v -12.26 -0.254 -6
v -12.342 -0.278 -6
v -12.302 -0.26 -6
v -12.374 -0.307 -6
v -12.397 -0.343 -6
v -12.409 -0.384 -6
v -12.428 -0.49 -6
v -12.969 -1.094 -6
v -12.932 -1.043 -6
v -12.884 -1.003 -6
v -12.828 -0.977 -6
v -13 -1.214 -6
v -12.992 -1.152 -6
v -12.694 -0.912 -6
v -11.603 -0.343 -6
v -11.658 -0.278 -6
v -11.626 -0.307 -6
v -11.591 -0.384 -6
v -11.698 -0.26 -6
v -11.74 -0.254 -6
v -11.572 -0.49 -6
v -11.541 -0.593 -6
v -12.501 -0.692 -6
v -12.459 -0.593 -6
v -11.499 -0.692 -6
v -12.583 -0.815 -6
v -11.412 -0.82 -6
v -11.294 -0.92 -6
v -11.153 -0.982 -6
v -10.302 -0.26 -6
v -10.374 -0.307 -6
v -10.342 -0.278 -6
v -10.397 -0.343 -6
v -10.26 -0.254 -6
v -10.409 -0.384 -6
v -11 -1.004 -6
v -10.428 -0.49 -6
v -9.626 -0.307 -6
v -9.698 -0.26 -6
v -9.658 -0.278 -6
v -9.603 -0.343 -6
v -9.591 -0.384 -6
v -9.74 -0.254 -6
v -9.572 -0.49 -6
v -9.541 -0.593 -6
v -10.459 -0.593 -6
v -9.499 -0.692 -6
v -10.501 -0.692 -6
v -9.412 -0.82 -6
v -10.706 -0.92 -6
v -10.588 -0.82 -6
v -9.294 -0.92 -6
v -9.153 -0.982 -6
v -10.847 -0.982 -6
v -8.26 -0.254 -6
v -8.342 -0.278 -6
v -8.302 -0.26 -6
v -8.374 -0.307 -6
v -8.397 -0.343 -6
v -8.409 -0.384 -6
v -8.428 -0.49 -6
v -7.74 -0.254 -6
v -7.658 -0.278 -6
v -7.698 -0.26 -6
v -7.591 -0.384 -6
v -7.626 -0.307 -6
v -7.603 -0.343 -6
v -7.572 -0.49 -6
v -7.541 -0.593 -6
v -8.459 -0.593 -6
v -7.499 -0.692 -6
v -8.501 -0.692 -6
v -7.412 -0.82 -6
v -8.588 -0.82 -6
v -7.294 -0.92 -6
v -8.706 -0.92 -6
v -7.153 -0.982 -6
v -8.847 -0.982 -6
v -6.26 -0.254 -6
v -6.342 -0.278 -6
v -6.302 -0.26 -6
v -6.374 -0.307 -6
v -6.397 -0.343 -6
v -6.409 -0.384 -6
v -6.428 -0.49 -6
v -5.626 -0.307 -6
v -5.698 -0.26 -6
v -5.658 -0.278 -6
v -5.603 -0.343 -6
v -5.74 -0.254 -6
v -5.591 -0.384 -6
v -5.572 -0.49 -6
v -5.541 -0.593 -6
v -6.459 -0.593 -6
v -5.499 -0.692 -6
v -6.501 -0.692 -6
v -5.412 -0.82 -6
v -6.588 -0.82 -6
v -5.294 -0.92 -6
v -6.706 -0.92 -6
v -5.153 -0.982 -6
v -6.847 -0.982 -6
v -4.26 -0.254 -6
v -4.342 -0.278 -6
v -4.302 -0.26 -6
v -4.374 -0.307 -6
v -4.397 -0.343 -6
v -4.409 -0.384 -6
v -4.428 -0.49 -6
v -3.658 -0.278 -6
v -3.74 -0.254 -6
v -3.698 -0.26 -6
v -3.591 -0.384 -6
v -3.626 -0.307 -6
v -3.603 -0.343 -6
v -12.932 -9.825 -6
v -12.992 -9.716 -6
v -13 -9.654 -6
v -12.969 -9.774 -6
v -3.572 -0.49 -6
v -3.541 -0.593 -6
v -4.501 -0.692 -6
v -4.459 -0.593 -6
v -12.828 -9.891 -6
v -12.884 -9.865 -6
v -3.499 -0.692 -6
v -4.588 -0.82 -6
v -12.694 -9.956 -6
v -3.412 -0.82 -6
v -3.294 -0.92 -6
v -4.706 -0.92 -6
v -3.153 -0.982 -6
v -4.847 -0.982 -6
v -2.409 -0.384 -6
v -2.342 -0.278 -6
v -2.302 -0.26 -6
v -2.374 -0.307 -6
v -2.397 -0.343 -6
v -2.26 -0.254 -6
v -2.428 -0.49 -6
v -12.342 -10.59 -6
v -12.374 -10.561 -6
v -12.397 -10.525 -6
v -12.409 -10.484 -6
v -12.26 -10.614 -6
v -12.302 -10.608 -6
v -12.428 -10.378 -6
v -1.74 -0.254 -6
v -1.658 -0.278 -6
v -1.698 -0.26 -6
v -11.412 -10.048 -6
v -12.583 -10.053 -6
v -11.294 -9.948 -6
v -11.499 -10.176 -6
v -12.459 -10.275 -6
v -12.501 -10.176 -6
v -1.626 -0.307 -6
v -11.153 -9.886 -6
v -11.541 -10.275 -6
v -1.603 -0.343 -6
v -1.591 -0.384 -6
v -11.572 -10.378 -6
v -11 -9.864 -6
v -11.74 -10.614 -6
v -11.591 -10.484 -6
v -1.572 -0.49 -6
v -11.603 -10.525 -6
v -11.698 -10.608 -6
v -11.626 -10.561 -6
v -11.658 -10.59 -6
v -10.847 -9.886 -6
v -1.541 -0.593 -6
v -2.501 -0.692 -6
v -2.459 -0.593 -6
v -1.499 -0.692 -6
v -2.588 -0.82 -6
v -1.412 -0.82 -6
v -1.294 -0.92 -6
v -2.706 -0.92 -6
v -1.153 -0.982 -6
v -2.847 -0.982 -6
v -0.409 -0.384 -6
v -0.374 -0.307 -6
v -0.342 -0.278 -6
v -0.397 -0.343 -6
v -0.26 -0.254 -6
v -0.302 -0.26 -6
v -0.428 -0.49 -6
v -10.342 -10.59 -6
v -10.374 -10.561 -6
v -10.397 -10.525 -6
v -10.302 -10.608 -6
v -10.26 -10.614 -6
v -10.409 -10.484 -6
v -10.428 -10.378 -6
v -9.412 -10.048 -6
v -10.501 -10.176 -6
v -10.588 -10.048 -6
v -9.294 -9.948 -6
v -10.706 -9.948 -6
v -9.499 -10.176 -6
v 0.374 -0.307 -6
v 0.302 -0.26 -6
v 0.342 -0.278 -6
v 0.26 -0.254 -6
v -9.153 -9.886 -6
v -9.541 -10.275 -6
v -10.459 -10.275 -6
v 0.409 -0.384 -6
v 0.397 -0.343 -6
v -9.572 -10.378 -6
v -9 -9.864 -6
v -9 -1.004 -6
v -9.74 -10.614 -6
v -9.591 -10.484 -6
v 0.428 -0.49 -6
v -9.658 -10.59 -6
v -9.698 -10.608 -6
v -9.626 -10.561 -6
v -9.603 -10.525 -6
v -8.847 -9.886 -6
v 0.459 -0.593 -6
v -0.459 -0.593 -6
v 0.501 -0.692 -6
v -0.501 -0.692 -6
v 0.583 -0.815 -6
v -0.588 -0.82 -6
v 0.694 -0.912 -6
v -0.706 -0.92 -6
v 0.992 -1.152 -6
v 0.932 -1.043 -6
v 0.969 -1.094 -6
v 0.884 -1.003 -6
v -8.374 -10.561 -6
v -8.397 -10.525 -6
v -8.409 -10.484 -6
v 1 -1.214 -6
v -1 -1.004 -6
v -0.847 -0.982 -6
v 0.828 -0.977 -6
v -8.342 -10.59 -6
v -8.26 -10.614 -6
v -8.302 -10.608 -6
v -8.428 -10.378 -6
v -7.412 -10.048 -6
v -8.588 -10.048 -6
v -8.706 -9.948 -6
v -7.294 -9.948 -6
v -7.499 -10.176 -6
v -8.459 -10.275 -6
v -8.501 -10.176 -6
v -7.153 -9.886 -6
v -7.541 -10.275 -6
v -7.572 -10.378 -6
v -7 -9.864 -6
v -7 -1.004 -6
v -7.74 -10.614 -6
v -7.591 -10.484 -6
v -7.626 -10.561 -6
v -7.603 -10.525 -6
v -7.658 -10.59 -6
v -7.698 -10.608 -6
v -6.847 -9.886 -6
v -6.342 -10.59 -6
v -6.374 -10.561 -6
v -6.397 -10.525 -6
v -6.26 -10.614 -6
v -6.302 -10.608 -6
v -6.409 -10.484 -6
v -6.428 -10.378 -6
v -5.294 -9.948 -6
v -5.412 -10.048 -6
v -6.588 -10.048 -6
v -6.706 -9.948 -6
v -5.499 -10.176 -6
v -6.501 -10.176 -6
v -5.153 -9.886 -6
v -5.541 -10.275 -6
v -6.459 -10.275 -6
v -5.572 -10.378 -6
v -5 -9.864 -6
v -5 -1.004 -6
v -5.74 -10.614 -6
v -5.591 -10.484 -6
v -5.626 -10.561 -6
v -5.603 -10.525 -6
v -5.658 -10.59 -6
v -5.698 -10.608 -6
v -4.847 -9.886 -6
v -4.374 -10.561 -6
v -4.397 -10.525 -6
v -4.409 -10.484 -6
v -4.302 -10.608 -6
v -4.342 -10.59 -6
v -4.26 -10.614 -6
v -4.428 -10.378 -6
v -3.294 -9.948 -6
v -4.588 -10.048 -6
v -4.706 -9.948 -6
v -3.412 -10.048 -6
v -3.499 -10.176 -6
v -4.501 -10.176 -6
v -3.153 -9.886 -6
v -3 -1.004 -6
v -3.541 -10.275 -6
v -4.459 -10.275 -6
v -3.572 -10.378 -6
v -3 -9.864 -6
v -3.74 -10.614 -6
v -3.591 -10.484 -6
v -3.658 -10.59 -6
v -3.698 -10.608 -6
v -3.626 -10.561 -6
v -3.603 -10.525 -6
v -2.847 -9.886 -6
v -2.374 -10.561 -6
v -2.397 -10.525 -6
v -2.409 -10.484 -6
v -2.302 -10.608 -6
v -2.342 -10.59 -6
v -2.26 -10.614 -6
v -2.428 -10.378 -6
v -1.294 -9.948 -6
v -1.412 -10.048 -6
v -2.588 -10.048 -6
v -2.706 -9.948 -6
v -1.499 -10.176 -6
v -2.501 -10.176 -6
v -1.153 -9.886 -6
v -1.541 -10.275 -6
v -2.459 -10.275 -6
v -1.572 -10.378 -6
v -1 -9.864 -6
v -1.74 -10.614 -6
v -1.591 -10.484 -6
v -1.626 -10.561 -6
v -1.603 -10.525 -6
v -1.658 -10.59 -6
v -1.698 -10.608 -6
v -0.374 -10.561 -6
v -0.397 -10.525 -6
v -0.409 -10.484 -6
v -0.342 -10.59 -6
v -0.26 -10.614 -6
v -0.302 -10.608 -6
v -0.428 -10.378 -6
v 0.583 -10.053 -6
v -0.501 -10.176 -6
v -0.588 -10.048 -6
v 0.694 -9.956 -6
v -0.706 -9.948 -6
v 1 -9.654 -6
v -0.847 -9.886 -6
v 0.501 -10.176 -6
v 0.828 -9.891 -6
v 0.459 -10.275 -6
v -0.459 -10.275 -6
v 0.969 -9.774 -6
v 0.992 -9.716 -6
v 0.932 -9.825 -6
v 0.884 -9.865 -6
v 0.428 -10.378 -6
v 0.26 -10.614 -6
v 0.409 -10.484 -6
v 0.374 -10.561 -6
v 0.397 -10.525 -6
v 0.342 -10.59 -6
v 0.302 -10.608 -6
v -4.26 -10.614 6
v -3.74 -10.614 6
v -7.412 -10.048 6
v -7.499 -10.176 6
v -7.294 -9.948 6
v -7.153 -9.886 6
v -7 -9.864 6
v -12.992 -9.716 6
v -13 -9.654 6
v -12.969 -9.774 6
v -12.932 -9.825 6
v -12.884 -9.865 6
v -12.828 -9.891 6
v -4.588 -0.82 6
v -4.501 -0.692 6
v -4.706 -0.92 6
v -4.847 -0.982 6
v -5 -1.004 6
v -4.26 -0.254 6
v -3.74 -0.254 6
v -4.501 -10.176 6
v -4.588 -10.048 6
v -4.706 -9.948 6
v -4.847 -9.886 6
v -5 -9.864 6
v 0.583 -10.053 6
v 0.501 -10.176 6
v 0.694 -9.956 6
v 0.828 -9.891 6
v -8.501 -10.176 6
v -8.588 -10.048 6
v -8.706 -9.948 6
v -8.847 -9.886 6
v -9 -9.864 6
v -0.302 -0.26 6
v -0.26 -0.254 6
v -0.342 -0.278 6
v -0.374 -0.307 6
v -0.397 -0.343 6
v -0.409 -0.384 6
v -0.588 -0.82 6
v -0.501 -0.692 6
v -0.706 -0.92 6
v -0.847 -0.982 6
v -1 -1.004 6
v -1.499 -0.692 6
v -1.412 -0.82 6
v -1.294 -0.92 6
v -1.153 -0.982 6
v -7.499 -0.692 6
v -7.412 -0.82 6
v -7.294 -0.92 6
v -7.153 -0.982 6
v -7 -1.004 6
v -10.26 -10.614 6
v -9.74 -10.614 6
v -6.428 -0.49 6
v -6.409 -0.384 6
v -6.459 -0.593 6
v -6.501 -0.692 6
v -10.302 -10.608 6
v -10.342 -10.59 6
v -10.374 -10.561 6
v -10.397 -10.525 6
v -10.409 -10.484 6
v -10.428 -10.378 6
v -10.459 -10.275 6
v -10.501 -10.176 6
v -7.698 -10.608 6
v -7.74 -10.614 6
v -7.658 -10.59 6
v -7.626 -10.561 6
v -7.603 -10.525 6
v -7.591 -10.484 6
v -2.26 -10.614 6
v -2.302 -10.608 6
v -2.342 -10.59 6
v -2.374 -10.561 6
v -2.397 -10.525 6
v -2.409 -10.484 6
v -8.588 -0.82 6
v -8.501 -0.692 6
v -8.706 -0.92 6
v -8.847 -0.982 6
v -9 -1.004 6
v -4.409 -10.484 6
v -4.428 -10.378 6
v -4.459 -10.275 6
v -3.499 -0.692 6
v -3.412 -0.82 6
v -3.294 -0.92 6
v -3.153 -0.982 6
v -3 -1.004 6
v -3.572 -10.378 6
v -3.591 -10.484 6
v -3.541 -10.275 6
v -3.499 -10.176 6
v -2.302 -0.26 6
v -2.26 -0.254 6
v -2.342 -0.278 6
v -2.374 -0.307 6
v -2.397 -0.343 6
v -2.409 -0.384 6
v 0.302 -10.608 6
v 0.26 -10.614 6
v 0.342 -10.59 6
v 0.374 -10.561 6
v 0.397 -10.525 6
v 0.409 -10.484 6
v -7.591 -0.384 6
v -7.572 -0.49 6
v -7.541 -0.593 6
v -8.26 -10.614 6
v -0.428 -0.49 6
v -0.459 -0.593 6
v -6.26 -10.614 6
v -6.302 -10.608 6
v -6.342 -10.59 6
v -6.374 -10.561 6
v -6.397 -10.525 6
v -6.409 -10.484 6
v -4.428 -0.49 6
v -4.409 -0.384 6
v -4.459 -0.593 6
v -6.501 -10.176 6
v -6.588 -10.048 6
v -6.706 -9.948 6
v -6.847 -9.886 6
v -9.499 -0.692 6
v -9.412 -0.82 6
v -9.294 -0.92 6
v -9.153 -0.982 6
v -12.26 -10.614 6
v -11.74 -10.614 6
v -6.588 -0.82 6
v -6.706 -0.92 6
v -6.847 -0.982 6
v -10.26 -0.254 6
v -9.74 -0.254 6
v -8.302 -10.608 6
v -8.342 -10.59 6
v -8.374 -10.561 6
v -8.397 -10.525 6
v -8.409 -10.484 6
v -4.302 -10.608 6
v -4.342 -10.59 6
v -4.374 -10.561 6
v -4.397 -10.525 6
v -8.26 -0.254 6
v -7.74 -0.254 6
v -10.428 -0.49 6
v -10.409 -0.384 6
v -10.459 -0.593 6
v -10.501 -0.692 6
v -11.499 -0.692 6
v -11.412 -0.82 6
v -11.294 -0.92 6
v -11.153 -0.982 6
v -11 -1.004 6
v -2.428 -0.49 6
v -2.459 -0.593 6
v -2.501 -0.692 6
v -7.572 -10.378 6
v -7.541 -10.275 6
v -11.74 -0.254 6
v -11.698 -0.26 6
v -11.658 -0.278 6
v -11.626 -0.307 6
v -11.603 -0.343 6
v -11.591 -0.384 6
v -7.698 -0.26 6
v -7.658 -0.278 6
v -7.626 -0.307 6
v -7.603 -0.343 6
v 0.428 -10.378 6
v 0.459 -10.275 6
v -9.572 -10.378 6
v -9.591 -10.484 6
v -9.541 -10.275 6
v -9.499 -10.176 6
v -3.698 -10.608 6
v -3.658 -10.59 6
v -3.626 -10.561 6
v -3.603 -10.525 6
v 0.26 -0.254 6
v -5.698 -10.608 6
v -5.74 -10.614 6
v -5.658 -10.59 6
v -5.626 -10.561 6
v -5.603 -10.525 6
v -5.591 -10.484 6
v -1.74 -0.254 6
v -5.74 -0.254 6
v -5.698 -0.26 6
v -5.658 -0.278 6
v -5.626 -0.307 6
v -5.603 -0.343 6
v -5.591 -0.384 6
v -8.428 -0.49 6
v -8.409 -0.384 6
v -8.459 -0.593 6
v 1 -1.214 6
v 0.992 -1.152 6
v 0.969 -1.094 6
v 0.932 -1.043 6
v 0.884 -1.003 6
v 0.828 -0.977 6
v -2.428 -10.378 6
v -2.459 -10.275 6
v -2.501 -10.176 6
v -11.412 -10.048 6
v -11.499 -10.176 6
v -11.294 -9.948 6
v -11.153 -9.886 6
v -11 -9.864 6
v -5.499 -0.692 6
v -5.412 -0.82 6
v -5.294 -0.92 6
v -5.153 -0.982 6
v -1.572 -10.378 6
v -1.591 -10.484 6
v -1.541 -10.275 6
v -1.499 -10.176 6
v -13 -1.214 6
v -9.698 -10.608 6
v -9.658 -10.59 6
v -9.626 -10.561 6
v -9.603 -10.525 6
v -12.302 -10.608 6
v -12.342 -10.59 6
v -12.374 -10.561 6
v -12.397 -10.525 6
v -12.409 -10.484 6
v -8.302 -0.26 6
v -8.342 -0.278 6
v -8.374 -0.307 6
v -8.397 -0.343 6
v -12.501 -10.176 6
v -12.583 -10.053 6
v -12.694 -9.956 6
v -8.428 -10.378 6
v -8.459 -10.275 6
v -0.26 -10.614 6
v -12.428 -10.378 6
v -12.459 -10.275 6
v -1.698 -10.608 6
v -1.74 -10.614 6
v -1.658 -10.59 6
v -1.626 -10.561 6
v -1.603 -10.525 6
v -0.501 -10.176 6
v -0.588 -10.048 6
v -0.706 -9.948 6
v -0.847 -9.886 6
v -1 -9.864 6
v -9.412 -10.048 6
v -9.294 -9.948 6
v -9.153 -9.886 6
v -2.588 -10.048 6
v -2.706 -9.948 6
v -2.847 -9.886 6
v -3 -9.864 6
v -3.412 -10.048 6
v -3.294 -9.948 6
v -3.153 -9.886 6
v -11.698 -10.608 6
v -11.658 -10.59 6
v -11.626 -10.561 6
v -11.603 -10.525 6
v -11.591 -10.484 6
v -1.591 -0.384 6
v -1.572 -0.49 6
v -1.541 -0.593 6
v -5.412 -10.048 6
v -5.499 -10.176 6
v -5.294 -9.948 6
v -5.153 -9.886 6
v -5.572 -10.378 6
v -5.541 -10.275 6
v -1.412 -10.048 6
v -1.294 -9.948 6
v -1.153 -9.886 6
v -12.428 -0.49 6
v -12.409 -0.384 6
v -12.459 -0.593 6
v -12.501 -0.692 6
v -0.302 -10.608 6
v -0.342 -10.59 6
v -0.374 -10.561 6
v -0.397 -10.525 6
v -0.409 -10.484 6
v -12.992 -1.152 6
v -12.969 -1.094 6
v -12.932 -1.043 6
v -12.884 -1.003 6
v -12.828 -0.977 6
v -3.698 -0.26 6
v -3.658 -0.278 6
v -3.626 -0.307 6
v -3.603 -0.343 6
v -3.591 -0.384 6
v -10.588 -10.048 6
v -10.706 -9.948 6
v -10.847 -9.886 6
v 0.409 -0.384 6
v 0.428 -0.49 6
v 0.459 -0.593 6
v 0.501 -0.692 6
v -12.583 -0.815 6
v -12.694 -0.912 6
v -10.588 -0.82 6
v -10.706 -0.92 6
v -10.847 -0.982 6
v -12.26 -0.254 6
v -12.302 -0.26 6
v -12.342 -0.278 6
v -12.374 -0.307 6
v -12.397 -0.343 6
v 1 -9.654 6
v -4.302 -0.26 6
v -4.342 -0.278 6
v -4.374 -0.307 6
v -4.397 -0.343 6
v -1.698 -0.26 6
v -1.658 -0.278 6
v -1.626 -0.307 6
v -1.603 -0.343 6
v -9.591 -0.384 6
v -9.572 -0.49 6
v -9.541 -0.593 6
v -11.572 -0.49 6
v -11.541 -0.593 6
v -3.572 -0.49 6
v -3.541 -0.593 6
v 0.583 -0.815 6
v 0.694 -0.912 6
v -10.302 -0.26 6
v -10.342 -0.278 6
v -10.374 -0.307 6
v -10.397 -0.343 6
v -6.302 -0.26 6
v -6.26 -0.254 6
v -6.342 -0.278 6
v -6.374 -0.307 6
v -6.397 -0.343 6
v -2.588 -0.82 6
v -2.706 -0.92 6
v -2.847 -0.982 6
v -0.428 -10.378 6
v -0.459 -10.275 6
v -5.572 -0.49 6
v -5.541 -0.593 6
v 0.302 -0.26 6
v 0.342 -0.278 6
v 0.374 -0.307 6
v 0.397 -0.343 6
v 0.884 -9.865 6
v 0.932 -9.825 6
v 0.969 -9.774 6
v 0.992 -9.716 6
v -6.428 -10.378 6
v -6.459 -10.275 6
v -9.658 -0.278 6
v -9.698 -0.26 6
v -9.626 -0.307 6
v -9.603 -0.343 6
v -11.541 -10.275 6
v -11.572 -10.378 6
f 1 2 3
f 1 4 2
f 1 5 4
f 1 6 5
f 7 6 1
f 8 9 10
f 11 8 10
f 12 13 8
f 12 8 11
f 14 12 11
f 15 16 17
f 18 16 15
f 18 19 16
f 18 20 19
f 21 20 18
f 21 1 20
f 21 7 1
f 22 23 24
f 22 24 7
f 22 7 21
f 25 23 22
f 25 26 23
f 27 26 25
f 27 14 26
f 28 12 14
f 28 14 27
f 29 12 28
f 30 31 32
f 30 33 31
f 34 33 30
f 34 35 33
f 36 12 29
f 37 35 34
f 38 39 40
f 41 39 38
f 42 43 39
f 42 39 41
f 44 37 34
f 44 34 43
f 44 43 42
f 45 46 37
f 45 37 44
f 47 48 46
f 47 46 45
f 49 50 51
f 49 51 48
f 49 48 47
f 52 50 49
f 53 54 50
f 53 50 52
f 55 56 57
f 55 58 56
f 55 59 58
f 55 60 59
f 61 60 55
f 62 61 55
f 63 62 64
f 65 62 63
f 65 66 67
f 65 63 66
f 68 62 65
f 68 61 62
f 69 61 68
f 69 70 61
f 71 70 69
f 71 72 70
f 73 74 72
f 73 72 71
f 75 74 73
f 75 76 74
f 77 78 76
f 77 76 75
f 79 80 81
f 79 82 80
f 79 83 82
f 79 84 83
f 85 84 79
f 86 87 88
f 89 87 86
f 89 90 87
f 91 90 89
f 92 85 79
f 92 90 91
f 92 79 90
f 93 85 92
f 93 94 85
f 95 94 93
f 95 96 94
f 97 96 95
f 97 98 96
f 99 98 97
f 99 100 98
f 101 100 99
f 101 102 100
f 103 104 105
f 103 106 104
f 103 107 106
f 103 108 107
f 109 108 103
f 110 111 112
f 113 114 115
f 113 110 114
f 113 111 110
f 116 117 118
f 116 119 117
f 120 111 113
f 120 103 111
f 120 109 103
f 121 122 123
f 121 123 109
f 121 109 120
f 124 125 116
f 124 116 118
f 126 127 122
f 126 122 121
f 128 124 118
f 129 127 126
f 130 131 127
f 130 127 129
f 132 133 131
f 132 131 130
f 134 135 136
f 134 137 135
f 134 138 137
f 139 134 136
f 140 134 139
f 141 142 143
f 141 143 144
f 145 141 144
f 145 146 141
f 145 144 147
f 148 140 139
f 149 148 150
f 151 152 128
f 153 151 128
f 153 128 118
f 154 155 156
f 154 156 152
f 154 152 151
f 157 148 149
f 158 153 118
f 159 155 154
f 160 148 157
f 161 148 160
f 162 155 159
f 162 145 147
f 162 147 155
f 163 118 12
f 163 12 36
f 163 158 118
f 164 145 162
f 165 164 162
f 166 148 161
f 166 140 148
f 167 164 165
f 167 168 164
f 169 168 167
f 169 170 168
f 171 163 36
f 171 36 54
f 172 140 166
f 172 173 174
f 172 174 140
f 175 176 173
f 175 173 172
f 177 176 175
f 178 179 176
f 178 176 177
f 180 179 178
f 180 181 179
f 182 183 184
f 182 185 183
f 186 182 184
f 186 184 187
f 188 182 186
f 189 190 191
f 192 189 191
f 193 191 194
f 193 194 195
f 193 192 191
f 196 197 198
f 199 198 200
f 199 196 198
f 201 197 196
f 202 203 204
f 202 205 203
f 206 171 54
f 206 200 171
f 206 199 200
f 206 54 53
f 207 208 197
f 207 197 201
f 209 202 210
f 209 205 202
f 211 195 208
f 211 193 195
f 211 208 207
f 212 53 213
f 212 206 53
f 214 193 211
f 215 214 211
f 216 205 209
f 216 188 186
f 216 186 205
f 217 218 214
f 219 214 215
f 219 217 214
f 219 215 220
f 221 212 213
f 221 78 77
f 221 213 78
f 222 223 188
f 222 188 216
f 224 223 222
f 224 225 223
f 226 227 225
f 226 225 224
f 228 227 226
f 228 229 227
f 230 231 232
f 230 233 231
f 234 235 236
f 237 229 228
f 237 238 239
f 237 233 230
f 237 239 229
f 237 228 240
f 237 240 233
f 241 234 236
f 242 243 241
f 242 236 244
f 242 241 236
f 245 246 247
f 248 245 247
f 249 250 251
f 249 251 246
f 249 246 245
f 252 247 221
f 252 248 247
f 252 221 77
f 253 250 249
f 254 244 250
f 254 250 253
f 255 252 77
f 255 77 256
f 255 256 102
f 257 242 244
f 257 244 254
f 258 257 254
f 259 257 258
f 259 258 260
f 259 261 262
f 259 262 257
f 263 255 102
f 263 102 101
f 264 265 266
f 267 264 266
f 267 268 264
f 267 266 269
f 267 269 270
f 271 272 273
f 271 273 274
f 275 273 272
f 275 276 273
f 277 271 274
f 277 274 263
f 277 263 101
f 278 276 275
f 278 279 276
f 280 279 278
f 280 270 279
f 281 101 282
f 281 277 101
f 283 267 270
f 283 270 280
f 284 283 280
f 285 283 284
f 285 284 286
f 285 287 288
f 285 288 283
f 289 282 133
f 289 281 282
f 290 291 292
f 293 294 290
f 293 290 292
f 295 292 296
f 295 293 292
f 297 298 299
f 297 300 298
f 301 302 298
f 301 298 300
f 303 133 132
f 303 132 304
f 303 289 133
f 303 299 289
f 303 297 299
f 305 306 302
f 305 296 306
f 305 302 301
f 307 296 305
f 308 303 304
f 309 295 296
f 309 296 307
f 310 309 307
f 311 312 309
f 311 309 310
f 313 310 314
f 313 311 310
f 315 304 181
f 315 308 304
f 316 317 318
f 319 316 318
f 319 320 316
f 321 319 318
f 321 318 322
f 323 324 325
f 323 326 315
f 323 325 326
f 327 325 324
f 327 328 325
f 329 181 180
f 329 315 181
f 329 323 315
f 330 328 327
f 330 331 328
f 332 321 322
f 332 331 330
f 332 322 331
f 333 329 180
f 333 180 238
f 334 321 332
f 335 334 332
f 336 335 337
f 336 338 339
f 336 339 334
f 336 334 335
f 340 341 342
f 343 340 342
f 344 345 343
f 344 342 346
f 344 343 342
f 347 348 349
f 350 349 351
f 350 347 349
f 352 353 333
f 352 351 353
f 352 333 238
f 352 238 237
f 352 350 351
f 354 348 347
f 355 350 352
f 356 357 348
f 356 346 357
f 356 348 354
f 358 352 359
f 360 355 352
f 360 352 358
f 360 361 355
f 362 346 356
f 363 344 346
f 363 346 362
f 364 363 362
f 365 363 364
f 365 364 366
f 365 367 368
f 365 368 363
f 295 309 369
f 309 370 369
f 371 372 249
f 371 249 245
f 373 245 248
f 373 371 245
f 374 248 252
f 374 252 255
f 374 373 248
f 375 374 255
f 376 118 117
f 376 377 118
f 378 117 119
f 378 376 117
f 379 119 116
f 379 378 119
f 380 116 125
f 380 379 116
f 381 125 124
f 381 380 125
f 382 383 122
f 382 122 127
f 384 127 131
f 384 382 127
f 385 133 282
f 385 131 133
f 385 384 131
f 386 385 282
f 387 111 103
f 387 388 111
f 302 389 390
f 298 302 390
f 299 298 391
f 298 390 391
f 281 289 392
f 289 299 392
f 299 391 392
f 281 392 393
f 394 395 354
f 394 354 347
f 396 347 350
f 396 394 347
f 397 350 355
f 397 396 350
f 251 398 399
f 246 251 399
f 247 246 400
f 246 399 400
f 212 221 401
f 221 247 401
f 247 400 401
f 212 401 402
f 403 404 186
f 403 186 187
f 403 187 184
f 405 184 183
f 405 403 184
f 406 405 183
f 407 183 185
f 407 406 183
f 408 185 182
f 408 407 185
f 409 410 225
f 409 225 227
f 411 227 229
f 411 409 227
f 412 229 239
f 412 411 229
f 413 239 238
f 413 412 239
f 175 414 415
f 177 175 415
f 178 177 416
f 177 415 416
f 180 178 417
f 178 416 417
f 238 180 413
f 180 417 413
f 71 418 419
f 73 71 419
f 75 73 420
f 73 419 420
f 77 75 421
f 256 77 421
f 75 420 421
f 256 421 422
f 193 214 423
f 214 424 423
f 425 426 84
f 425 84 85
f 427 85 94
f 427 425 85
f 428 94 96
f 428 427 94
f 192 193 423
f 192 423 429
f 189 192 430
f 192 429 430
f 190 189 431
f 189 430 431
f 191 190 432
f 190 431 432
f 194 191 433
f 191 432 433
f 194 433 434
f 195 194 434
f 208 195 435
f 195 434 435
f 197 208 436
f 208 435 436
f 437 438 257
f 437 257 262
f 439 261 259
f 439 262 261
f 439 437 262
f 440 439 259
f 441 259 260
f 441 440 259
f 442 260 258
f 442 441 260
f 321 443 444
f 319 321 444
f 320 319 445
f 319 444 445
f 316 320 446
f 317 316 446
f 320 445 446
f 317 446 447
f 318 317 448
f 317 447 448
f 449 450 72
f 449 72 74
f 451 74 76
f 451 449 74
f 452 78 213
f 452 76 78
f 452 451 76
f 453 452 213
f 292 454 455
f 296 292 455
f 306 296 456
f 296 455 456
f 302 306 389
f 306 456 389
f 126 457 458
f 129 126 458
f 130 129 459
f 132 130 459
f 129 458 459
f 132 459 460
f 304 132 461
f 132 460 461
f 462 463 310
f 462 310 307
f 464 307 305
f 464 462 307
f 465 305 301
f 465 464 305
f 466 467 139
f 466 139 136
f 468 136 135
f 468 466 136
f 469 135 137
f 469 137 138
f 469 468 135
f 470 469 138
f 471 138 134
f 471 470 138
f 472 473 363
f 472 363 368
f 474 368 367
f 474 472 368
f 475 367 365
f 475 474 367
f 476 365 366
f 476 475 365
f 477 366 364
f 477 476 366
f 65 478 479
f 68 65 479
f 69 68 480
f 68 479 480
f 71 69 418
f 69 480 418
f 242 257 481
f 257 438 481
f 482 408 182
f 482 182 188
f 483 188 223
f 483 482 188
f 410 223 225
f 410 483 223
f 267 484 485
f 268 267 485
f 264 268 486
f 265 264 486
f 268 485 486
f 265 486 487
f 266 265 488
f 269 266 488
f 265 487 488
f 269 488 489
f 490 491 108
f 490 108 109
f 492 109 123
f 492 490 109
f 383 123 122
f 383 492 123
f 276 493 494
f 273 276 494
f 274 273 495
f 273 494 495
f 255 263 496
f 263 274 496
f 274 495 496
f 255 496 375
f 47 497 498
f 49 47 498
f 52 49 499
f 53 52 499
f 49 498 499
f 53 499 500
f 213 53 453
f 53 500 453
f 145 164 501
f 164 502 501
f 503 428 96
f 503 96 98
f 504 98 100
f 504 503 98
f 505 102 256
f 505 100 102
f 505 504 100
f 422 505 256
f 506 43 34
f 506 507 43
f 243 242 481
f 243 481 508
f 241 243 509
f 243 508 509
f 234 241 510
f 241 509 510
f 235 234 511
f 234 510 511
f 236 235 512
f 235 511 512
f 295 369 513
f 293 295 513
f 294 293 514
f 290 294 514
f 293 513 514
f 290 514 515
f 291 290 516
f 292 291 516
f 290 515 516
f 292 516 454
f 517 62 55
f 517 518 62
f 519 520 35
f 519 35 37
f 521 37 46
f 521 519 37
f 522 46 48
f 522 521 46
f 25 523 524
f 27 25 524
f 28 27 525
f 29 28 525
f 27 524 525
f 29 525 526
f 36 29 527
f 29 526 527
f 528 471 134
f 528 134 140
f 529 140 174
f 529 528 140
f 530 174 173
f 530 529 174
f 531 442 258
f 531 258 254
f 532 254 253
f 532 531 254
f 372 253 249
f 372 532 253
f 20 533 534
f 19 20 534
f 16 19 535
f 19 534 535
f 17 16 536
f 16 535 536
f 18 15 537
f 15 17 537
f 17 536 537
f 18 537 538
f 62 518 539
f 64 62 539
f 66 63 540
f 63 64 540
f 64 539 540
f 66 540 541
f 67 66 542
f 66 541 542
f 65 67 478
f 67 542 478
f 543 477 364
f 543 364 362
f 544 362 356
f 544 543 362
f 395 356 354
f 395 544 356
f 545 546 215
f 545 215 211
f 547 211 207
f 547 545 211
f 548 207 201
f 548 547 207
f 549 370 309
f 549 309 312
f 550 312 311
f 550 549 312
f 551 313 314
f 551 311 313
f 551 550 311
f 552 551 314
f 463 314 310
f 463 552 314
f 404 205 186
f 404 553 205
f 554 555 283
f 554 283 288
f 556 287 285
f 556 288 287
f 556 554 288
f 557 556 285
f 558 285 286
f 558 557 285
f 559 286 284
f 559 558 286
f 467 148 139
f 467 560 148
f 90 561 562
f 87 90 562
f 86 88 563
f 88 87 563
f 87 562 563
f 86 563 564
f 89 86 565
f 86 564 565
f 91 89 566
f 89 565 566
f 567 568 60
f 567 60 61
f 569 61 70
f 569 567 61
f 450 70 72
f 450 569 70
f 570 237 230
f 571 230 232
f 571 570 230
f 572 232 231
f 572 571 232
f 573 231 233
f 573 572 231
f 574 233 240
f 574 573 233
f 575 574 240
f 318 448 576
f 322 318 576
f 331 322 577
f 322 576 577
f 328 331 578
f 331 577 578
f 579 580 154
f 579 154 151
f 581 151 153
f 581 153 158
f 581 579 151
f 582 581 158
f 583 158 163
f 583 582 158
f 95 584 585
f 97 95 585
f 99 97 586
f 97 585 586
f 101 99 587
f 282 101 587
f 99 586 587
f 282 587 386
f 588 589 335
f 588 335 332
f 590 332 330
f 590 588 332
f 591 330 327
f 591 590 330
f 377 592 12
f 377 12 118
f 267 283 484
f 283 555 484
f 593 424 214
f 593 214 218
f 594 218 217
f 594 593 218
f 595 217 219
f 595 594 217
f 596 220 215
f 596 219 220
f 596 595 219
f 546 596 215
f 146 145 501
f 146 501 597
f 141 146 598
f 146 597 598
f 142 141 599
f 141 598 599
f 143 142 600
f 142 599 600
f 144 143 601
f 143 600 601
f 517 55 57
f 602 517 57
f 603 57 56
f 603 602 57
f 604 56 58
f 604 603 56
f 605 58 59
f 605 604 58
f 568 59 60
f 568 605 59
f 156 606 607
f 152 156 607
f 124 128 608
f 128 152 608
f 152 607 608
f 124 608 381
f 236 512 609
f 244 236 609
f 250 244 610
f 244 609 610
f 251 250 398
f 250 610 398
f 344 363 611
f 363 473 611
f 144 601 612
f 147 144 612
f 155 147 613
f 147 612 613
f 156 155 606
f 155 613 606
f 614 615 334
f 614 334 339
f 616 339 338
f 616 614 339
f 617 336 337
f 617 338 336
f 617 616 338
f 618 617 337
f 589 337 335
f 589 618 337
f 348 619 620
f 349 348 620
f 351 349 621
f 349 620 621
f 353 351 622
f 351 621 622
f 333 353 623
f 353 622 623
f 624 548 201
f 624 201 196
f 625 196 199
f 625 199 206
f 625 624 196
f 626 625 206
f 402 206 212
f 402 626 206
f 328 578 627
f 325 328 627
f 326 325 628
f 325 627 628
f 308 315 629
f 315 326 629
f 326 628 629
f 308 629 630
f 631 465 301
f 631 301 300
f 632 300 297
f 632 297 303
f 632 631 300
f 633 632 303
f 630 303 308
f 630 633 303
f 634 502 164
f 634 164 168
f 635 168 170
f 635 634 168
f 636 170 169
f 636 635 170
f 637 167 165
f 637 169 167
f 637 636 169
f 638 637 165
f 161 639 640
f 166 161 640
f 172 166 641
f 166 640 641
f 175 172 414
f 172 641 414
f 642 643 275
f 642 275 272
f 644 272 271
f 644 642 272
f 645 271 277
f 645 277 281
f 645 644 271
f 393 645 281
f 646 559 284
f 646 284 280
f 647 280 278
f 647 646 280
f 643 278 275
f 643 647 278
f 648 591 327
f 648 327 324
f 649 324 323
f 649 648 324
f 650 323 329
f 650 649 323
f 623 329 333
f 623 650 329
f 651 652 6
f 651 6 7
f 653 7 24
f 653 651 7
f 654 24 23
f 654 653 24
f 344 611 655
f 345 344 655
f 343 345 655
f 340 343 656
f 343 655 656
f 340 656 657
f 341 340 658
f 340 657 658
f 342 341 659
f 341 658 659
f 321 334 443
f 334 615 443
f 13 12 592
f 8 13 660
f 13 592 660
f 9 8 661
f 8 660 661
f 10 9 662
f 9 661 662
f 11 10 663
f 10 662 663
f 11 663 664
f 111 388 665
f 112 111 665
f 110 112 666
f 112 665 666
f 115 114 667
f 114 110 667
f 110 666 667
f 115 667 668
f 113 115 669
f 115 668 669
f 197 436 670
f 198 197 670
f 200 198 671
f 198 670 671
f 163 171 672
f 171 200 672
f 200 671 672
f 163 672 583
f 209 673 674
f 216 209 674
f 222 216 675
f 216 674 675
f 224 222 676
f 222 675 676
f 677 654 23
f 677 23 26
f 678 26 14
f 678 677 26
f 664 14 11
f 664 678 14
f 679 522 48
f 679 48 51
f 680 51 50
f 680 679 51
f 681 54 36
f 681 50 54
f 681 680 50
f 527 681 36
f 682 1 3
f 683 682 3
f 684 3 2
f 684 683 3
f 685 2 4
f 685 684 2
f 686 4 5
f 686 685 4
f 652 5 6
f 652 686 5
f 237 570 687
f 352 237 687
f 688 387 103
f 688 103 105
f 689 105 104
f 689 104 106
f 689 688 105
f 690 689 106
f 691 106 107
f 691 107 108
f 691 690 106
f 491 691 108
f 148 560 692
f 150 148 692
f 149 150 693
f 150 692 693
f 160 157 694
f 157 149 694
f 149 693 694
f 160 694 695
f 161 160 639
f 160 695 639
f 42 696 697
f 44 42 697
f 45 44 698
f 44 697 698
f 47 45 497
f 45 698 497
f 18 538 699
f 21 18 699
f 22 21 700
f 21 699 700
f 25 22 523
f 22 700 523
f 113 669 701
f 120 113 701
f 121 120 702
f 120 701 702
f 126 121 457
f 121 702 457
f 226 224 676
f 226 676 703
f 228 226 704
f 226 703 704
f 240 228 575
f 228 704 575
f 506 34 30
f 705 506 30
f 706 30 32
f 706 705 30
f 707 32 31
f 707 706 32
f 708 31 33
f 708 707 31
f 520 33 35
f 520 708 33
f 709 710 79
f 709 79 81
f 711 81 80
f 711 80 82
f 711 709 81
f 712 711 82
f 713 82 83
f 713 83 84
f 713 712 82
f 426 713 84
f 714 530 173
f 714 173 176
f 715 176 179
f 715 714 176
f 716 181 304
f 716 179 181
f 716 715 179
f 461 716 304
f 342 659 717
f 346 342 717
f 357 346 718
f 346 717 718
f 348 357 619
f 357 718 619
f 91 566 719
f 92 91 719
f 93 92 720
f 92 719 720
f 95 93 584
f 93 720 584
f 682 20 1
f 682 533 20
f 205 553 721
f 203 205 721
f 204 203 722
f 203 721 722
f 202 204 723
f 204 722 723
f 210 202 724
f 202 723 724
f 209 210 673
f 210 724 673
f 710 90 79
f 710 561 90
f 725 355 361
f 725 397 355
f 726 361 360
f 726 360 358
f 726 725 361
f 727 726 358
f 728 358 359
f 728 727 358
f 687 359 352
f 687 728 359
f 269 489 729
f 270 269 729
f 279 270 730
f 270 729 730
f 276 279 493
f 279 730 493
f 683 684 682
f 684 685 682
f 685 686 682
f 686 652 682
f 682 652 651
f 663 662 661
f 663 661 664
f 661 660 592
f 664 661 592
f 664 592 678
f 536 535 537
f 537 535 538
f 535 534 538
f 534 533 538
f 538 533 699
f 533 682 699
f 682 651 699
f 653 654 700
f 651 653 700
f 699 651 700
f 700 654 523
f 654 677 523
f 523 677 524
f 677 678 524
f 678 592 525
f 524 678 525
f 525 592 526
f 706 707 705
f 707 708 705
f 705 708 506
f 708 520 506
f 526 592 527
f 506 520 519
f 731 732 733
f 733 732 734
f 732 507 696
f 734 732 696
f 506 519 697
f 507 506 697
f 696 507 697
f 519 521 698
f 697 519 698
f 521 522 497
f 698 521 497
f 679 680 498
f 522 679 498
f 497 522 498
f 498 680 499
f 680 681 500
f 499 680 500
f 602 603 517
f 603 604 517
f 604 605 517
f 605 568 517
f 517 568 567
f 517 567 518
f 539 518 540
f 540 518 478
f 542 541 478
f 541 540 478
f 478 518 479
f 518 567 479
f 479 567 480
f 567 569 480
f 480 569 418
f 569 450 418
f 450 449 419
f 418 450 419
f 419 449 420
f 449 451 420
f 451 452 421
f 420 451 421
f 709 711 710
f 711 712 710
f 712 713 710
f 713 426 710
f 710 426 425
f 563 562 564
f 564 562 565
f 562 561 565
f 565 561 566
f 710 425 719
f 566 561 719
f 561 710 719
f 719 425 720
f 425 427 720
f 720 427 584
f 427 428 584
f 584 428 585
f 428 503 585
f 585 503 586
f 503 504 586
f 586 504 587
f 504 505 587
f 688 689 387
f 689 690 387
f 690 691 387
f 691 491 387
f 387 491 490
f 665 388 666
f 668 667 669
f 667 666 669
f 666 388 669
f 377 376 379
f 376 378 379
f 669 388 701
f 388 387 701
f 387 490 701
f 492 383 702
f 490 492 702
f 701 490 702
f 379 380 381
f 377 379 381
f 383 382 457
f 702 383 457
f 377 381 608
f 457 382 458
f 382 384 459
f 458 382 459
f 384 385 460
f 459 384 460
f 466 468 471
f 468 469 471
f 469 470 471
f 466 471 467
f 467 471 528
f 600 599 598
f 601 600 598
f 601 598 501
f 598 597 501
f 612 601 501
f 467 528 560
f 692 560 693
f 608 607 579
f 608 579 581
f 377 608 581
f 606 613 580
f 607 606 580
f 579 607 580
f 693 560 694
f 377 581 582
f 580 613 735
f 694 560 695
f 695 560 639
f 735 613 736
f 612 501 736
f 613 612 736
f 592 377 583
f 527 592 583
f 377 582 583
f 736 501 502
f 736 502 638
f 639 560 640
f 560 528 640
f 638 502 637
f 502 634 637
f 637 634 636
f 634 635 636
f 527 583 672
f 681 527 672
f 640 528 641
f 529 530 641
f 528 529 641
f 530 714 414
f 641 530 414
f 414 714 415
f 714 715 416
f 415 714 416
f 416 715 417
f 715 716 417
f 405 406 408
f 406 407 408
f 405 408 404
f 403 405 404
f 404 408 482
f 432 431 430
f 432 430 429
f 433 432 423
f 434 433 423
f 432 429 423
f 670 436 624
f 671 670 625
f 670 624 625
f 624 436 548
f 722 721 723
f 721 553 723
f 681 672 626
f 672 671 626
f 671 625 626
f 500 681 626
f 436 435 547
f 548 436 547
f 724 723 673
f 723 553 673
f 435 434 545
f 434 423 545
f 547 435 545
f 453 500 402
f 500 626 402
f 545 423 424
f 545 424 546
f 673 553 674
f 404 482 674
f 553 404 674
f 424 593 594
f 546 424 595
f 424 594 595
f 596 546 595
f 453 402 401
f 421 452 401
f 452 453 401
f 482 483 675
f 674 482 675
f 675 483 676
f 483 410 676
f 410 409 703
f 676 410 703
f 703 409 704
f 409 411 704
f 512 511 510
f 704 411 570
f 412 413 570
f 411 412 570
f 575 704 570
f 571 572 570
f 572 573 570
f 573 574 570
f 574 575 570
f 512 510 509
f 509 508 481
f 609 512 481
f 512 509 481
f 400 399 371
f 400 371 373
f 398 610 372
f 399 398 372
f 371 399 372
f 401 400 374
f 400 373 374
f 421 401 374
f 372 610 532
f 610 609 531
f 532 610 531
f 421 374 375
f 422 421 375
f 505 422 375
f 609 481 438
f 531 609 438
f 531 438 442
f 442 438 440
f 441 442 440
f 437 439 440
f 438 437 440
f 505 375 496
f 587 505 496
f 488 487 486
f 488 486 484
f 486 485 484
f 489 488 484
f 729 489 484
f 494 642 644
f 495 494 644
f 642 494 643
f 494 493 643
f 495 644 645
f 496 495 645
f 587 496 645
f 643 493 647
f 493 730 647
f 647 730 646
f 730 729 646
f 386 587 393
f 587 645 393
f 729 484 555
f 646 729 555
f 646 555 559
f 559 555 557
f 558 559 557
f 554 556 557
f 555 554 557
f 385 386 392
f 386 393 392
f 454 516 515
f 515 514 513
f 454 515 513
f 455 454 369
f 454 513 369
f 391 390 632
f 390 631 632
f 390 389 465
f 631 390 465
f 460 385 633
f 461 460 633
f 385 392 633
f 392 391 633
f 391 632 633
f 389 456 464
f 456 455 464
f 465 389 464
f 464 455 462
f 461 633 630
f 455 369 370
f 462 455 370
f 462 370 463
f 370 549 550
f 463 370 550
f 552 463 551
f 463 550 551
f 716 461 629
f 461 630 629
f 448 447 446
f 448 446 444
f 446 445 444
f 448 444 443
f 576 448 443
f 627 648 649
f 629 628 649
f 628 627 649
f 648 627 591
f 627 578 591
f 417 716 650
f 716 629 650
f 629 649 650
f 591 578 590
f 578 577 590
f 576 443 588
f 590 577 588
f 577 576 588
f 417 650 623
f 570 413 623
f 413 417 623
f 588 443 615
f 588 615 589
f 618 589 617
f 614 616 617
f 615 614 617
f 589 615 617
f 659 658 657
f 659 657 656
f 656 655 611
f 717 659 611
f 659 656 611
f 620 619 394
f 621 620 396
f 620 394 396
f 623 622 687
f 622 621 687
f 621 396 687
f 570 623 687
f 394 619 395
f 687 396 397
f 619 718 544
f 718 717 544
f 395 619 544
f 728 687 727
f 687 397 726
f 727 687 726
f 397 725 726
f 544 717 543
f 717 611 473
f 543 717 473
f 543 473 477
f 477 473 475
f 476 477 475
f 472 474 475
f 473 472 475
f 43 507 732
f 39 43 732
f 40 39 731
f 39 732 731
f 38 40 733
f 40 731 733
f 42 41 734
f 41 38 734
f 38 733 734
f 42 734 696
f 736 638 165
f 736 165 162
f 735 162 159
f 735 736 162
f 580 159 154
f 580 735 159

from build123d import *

# Parameters (mm, degrees)
BOSS_EXTRUDE1_DEPTH = 6.35
LPATTERN1_COUNT     = 7
LPATTERN1_PITCH     = 2
SKETCH4_W           = 14
SKETCH4_H           = 5.95
BOSS_EXTRUDE3_DEPTH = 6
FILLET1_R           = 0.25


with BuildPart() as part:
    # Sketch1 → Boss-Extrude1 (new, symmetric)
    with BuildSketch(Plane.XY):
        with BuildLine():
            Line((0, 0), (0, -0.254))
            Line((0, -0.254), (0.259824575, -0.254))
            ThreePointArc((0.259824575, -0.254), (0.358731646, -0.291228588), (0.408543109, -0.384434783))
            ThreePointArc((0.408543109, -0.384434783), (0.442388286, -0.542062154), (0.501123596, -0.692202247))
            ThreePointArc((0.501123596, -0.692202247), (0.705850588, -0.919639059), (1, -1.004))
            Line((1, -1.004), (1, 0))
            Line((1, 0), (1, 0.516))
            Line((1, 0.516), (0, 0.516))
            Line((0, 0.516), (0, 0))
        make_face()
    extrude(amount=BOSS_EXTRUDE1_DEPTH, both=True)

    # Mirror1: part across plane


with BuildPart() as part_1:
    add(part.part)
    add(part.part.mirror(Plane(origin=(0, 0, 6.35), x_dir=(0, 0, 1), z_dir=(1, 0, 0))))


with BuildPart() as lpattern1_1:
    # LPattern1: pattern copy
    add(part_1.part.moved(Location(Vector(-1, 0, 0) * (1 * LPATTERN1_PITCH))))


with BuildPart() as lpattern1_2:
    # LPattern1: pattern copy
    add(part_1.part.moved(Location(Vector(-1, 0, 0) * (2 * LPATTERN1_PITCH))))


with BuildPart() as lpattern1_3:
    # LPattern1: pattern copy
    add(part_1.part.moved(Location(Vector(-1, 0, 0) * (3 * LPATTERN1_PITCH))))


with BuildPart() as lpattern1_4:
    # LPattern1: pattern copy
    add(part_1.part.moved(Location(Vector(-1, 0, 0) * (4 * LPATTERN1_PITCH))))


with BuildPart() as lpattern1_5:
    # LPattern1: pattern copy
    add(part_1.part.moved(Location(Vector(-1, 0, 0) * (5 * LPATTERN1_PITCH))))


with BuildPart() as lpattern1_6:
    # LPattern1: pattern copy
    add(part_1.part.moved(Location(Vector(-1, 0, 0) * (6 * LPATTERN1_PITCH))))


with BuildPart() as lpattern1_1_1:
    add(lpattern1_1.part)

    # Combine1: union LPattern1_4, part, LPattern1_3, LPattern1_2, LPattern1_5, LPattern1_6
    add(lpattern1_4.part)
    add(part_1.part)
    add(lpattern1_3.part)
    add(lpattern1_2.part)
    add(lpattern1_5.part)
    add(lpattern1_6.part)


with BuildPart() as body_2:
    # Sketch4 → Boss-Extrude3 (new, symmetric)
    with BuildSketch(Plane.XY):
        with Locations((-6, -2.459)):
            Rectangle(SKETCH4_W, SKETCH4_H)
    extrude(amount=BOSS_EXTRUDE3_DEPTH, both=True)

    # Combine2: cut LPattern1_1
    add(lpattern1_1_1.part, mode=Mode.SUBTRACT)

    # Mirror2: body 2 across plane


with BuildPart() as body_2_1:
    add(body_2.part)
    add(body_2.part.mirror(Plane(origin=(1, -5.434, 6), x_dir=(0, 0, 1), z_dir=(0, 1, 0))))

    # Fillet1
    fillet1_edges = [body_2_1.edges().sort_by_distance(p)[0] for p in [
        (1, -9.864, 0),
        (-13, -9.864, 0),
        (-13, -1.004, 0),
        (1, -1.004, 0),
    ]]
    fillet(fillet1_edges, radius=FILLET1_R)


solid = body_2_1.part
